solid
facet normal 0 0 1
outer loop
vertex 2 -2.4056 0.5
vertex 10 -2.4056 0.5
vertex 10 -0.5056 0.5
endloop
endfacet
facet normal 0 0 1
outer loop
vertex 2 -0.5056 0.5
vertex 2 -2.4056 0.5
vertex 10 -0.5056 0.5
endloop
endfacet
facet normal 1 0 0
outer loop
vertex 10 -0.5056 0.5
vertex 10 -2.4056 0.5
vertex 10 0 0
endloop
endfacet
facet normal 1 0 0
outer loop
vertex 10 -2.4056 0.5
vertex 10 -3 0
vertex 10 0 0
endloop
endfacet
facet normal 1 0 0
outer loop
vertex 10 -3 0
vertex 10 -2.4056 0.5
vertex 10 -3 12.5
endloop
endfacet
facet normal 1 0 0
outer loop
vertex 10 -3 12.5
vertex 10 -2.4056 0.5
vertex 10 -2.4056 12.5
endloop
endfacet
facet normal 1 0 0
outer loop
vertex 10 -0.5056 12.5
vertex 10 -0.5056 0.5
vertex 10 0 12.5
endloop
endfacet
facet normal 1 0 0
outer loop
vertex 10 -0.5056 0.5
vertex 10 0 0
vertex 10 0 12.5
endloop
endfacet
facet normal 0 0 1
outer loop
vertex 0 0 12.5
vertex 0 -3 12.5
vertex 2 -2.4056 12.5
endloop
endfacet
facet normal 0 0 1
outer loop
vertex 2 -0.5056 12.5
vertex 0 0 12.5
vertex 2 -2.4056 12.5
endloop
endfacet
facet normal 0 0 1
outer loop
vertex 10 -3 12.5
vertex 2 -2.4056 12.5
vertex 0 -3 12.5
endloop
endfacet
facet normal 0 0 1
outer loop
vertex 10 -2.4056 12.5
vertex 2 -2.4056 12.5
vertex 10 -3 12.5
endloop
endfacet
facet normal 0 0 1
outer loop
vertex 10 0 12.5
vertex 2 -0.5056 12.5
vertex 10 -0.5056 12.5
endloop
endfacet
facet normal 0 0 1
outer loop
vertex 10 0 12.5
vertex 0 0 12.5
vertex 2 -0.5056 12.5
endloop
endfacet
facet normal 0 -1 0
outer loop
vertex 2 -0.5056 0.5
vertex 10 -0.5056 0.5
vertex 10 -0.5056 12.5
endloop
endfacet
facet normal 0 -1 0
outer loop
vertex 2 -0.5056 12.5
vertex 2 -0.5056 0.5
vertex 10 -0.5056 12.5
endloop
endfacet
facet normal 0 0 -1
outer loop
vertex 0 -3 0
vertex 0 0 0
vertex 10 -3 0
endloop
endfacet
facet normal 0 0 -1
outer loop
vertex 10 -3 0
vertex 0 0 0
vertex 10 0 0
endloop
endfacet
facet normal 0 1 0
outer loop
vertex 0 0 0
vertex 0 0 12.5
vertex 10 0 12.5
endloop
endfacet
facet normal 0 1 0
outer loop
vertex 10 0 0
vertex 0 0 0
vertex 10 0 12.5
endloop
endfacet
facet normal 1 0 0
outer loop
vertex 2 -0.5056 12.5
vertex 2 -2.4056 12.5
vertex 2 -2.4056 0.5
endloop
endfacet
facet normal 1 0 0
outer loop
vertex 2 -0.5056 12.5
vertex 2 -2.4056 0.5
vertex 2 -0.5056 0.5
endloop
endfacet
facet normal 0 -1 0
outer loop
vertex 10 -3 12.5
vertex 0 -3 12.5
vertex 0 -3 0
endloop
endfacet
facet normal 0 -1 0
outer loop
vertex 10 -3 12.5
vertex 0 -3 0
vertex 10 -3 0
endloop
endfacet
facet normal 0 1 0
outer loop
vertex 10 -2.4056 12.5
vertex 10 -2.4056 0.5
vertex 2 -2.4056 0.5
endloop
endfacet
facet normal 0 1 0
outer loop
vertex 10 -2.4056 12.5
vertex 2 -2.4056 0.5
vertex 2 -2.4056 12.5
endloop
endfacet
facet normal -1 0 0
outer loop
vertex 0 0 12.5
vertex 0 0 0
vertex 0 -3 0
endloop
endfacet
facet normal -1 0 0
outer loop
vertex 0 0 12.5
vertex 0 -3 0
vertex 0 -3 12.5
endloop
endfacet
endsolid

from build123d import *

# Parameters (mm, degrees)
F0_W     = 10
F0_H     = 12.5
F1_DEPTH = 3
F2_W     = 1.9
F2_H     = 12
F3_DEPTH = 8


# Not quite as in the source:
# - a feature names something its author has since deleted; it is built from what else it names


with BuildPart() as f1:
    # F0 (on Front) → F1 (new body)
    with BuildSketch(Plane.XZ):
        with Locations((5, 6.25)):
            Rectangle(F0_W, F0_H)
    extrude(amount=F1_DEPTH)

    # F2 (on face) → F3 (cut)
    with BuildSketch(Plane.YZ.offset(10)):
        with Locations((-1.4556478869, 6.5)):
            Rectangle(F2_W, F2_H)
    extrude(amount=-F3_DEPTH, mode=Mode.SUBTRACT)


solid = f1.part
